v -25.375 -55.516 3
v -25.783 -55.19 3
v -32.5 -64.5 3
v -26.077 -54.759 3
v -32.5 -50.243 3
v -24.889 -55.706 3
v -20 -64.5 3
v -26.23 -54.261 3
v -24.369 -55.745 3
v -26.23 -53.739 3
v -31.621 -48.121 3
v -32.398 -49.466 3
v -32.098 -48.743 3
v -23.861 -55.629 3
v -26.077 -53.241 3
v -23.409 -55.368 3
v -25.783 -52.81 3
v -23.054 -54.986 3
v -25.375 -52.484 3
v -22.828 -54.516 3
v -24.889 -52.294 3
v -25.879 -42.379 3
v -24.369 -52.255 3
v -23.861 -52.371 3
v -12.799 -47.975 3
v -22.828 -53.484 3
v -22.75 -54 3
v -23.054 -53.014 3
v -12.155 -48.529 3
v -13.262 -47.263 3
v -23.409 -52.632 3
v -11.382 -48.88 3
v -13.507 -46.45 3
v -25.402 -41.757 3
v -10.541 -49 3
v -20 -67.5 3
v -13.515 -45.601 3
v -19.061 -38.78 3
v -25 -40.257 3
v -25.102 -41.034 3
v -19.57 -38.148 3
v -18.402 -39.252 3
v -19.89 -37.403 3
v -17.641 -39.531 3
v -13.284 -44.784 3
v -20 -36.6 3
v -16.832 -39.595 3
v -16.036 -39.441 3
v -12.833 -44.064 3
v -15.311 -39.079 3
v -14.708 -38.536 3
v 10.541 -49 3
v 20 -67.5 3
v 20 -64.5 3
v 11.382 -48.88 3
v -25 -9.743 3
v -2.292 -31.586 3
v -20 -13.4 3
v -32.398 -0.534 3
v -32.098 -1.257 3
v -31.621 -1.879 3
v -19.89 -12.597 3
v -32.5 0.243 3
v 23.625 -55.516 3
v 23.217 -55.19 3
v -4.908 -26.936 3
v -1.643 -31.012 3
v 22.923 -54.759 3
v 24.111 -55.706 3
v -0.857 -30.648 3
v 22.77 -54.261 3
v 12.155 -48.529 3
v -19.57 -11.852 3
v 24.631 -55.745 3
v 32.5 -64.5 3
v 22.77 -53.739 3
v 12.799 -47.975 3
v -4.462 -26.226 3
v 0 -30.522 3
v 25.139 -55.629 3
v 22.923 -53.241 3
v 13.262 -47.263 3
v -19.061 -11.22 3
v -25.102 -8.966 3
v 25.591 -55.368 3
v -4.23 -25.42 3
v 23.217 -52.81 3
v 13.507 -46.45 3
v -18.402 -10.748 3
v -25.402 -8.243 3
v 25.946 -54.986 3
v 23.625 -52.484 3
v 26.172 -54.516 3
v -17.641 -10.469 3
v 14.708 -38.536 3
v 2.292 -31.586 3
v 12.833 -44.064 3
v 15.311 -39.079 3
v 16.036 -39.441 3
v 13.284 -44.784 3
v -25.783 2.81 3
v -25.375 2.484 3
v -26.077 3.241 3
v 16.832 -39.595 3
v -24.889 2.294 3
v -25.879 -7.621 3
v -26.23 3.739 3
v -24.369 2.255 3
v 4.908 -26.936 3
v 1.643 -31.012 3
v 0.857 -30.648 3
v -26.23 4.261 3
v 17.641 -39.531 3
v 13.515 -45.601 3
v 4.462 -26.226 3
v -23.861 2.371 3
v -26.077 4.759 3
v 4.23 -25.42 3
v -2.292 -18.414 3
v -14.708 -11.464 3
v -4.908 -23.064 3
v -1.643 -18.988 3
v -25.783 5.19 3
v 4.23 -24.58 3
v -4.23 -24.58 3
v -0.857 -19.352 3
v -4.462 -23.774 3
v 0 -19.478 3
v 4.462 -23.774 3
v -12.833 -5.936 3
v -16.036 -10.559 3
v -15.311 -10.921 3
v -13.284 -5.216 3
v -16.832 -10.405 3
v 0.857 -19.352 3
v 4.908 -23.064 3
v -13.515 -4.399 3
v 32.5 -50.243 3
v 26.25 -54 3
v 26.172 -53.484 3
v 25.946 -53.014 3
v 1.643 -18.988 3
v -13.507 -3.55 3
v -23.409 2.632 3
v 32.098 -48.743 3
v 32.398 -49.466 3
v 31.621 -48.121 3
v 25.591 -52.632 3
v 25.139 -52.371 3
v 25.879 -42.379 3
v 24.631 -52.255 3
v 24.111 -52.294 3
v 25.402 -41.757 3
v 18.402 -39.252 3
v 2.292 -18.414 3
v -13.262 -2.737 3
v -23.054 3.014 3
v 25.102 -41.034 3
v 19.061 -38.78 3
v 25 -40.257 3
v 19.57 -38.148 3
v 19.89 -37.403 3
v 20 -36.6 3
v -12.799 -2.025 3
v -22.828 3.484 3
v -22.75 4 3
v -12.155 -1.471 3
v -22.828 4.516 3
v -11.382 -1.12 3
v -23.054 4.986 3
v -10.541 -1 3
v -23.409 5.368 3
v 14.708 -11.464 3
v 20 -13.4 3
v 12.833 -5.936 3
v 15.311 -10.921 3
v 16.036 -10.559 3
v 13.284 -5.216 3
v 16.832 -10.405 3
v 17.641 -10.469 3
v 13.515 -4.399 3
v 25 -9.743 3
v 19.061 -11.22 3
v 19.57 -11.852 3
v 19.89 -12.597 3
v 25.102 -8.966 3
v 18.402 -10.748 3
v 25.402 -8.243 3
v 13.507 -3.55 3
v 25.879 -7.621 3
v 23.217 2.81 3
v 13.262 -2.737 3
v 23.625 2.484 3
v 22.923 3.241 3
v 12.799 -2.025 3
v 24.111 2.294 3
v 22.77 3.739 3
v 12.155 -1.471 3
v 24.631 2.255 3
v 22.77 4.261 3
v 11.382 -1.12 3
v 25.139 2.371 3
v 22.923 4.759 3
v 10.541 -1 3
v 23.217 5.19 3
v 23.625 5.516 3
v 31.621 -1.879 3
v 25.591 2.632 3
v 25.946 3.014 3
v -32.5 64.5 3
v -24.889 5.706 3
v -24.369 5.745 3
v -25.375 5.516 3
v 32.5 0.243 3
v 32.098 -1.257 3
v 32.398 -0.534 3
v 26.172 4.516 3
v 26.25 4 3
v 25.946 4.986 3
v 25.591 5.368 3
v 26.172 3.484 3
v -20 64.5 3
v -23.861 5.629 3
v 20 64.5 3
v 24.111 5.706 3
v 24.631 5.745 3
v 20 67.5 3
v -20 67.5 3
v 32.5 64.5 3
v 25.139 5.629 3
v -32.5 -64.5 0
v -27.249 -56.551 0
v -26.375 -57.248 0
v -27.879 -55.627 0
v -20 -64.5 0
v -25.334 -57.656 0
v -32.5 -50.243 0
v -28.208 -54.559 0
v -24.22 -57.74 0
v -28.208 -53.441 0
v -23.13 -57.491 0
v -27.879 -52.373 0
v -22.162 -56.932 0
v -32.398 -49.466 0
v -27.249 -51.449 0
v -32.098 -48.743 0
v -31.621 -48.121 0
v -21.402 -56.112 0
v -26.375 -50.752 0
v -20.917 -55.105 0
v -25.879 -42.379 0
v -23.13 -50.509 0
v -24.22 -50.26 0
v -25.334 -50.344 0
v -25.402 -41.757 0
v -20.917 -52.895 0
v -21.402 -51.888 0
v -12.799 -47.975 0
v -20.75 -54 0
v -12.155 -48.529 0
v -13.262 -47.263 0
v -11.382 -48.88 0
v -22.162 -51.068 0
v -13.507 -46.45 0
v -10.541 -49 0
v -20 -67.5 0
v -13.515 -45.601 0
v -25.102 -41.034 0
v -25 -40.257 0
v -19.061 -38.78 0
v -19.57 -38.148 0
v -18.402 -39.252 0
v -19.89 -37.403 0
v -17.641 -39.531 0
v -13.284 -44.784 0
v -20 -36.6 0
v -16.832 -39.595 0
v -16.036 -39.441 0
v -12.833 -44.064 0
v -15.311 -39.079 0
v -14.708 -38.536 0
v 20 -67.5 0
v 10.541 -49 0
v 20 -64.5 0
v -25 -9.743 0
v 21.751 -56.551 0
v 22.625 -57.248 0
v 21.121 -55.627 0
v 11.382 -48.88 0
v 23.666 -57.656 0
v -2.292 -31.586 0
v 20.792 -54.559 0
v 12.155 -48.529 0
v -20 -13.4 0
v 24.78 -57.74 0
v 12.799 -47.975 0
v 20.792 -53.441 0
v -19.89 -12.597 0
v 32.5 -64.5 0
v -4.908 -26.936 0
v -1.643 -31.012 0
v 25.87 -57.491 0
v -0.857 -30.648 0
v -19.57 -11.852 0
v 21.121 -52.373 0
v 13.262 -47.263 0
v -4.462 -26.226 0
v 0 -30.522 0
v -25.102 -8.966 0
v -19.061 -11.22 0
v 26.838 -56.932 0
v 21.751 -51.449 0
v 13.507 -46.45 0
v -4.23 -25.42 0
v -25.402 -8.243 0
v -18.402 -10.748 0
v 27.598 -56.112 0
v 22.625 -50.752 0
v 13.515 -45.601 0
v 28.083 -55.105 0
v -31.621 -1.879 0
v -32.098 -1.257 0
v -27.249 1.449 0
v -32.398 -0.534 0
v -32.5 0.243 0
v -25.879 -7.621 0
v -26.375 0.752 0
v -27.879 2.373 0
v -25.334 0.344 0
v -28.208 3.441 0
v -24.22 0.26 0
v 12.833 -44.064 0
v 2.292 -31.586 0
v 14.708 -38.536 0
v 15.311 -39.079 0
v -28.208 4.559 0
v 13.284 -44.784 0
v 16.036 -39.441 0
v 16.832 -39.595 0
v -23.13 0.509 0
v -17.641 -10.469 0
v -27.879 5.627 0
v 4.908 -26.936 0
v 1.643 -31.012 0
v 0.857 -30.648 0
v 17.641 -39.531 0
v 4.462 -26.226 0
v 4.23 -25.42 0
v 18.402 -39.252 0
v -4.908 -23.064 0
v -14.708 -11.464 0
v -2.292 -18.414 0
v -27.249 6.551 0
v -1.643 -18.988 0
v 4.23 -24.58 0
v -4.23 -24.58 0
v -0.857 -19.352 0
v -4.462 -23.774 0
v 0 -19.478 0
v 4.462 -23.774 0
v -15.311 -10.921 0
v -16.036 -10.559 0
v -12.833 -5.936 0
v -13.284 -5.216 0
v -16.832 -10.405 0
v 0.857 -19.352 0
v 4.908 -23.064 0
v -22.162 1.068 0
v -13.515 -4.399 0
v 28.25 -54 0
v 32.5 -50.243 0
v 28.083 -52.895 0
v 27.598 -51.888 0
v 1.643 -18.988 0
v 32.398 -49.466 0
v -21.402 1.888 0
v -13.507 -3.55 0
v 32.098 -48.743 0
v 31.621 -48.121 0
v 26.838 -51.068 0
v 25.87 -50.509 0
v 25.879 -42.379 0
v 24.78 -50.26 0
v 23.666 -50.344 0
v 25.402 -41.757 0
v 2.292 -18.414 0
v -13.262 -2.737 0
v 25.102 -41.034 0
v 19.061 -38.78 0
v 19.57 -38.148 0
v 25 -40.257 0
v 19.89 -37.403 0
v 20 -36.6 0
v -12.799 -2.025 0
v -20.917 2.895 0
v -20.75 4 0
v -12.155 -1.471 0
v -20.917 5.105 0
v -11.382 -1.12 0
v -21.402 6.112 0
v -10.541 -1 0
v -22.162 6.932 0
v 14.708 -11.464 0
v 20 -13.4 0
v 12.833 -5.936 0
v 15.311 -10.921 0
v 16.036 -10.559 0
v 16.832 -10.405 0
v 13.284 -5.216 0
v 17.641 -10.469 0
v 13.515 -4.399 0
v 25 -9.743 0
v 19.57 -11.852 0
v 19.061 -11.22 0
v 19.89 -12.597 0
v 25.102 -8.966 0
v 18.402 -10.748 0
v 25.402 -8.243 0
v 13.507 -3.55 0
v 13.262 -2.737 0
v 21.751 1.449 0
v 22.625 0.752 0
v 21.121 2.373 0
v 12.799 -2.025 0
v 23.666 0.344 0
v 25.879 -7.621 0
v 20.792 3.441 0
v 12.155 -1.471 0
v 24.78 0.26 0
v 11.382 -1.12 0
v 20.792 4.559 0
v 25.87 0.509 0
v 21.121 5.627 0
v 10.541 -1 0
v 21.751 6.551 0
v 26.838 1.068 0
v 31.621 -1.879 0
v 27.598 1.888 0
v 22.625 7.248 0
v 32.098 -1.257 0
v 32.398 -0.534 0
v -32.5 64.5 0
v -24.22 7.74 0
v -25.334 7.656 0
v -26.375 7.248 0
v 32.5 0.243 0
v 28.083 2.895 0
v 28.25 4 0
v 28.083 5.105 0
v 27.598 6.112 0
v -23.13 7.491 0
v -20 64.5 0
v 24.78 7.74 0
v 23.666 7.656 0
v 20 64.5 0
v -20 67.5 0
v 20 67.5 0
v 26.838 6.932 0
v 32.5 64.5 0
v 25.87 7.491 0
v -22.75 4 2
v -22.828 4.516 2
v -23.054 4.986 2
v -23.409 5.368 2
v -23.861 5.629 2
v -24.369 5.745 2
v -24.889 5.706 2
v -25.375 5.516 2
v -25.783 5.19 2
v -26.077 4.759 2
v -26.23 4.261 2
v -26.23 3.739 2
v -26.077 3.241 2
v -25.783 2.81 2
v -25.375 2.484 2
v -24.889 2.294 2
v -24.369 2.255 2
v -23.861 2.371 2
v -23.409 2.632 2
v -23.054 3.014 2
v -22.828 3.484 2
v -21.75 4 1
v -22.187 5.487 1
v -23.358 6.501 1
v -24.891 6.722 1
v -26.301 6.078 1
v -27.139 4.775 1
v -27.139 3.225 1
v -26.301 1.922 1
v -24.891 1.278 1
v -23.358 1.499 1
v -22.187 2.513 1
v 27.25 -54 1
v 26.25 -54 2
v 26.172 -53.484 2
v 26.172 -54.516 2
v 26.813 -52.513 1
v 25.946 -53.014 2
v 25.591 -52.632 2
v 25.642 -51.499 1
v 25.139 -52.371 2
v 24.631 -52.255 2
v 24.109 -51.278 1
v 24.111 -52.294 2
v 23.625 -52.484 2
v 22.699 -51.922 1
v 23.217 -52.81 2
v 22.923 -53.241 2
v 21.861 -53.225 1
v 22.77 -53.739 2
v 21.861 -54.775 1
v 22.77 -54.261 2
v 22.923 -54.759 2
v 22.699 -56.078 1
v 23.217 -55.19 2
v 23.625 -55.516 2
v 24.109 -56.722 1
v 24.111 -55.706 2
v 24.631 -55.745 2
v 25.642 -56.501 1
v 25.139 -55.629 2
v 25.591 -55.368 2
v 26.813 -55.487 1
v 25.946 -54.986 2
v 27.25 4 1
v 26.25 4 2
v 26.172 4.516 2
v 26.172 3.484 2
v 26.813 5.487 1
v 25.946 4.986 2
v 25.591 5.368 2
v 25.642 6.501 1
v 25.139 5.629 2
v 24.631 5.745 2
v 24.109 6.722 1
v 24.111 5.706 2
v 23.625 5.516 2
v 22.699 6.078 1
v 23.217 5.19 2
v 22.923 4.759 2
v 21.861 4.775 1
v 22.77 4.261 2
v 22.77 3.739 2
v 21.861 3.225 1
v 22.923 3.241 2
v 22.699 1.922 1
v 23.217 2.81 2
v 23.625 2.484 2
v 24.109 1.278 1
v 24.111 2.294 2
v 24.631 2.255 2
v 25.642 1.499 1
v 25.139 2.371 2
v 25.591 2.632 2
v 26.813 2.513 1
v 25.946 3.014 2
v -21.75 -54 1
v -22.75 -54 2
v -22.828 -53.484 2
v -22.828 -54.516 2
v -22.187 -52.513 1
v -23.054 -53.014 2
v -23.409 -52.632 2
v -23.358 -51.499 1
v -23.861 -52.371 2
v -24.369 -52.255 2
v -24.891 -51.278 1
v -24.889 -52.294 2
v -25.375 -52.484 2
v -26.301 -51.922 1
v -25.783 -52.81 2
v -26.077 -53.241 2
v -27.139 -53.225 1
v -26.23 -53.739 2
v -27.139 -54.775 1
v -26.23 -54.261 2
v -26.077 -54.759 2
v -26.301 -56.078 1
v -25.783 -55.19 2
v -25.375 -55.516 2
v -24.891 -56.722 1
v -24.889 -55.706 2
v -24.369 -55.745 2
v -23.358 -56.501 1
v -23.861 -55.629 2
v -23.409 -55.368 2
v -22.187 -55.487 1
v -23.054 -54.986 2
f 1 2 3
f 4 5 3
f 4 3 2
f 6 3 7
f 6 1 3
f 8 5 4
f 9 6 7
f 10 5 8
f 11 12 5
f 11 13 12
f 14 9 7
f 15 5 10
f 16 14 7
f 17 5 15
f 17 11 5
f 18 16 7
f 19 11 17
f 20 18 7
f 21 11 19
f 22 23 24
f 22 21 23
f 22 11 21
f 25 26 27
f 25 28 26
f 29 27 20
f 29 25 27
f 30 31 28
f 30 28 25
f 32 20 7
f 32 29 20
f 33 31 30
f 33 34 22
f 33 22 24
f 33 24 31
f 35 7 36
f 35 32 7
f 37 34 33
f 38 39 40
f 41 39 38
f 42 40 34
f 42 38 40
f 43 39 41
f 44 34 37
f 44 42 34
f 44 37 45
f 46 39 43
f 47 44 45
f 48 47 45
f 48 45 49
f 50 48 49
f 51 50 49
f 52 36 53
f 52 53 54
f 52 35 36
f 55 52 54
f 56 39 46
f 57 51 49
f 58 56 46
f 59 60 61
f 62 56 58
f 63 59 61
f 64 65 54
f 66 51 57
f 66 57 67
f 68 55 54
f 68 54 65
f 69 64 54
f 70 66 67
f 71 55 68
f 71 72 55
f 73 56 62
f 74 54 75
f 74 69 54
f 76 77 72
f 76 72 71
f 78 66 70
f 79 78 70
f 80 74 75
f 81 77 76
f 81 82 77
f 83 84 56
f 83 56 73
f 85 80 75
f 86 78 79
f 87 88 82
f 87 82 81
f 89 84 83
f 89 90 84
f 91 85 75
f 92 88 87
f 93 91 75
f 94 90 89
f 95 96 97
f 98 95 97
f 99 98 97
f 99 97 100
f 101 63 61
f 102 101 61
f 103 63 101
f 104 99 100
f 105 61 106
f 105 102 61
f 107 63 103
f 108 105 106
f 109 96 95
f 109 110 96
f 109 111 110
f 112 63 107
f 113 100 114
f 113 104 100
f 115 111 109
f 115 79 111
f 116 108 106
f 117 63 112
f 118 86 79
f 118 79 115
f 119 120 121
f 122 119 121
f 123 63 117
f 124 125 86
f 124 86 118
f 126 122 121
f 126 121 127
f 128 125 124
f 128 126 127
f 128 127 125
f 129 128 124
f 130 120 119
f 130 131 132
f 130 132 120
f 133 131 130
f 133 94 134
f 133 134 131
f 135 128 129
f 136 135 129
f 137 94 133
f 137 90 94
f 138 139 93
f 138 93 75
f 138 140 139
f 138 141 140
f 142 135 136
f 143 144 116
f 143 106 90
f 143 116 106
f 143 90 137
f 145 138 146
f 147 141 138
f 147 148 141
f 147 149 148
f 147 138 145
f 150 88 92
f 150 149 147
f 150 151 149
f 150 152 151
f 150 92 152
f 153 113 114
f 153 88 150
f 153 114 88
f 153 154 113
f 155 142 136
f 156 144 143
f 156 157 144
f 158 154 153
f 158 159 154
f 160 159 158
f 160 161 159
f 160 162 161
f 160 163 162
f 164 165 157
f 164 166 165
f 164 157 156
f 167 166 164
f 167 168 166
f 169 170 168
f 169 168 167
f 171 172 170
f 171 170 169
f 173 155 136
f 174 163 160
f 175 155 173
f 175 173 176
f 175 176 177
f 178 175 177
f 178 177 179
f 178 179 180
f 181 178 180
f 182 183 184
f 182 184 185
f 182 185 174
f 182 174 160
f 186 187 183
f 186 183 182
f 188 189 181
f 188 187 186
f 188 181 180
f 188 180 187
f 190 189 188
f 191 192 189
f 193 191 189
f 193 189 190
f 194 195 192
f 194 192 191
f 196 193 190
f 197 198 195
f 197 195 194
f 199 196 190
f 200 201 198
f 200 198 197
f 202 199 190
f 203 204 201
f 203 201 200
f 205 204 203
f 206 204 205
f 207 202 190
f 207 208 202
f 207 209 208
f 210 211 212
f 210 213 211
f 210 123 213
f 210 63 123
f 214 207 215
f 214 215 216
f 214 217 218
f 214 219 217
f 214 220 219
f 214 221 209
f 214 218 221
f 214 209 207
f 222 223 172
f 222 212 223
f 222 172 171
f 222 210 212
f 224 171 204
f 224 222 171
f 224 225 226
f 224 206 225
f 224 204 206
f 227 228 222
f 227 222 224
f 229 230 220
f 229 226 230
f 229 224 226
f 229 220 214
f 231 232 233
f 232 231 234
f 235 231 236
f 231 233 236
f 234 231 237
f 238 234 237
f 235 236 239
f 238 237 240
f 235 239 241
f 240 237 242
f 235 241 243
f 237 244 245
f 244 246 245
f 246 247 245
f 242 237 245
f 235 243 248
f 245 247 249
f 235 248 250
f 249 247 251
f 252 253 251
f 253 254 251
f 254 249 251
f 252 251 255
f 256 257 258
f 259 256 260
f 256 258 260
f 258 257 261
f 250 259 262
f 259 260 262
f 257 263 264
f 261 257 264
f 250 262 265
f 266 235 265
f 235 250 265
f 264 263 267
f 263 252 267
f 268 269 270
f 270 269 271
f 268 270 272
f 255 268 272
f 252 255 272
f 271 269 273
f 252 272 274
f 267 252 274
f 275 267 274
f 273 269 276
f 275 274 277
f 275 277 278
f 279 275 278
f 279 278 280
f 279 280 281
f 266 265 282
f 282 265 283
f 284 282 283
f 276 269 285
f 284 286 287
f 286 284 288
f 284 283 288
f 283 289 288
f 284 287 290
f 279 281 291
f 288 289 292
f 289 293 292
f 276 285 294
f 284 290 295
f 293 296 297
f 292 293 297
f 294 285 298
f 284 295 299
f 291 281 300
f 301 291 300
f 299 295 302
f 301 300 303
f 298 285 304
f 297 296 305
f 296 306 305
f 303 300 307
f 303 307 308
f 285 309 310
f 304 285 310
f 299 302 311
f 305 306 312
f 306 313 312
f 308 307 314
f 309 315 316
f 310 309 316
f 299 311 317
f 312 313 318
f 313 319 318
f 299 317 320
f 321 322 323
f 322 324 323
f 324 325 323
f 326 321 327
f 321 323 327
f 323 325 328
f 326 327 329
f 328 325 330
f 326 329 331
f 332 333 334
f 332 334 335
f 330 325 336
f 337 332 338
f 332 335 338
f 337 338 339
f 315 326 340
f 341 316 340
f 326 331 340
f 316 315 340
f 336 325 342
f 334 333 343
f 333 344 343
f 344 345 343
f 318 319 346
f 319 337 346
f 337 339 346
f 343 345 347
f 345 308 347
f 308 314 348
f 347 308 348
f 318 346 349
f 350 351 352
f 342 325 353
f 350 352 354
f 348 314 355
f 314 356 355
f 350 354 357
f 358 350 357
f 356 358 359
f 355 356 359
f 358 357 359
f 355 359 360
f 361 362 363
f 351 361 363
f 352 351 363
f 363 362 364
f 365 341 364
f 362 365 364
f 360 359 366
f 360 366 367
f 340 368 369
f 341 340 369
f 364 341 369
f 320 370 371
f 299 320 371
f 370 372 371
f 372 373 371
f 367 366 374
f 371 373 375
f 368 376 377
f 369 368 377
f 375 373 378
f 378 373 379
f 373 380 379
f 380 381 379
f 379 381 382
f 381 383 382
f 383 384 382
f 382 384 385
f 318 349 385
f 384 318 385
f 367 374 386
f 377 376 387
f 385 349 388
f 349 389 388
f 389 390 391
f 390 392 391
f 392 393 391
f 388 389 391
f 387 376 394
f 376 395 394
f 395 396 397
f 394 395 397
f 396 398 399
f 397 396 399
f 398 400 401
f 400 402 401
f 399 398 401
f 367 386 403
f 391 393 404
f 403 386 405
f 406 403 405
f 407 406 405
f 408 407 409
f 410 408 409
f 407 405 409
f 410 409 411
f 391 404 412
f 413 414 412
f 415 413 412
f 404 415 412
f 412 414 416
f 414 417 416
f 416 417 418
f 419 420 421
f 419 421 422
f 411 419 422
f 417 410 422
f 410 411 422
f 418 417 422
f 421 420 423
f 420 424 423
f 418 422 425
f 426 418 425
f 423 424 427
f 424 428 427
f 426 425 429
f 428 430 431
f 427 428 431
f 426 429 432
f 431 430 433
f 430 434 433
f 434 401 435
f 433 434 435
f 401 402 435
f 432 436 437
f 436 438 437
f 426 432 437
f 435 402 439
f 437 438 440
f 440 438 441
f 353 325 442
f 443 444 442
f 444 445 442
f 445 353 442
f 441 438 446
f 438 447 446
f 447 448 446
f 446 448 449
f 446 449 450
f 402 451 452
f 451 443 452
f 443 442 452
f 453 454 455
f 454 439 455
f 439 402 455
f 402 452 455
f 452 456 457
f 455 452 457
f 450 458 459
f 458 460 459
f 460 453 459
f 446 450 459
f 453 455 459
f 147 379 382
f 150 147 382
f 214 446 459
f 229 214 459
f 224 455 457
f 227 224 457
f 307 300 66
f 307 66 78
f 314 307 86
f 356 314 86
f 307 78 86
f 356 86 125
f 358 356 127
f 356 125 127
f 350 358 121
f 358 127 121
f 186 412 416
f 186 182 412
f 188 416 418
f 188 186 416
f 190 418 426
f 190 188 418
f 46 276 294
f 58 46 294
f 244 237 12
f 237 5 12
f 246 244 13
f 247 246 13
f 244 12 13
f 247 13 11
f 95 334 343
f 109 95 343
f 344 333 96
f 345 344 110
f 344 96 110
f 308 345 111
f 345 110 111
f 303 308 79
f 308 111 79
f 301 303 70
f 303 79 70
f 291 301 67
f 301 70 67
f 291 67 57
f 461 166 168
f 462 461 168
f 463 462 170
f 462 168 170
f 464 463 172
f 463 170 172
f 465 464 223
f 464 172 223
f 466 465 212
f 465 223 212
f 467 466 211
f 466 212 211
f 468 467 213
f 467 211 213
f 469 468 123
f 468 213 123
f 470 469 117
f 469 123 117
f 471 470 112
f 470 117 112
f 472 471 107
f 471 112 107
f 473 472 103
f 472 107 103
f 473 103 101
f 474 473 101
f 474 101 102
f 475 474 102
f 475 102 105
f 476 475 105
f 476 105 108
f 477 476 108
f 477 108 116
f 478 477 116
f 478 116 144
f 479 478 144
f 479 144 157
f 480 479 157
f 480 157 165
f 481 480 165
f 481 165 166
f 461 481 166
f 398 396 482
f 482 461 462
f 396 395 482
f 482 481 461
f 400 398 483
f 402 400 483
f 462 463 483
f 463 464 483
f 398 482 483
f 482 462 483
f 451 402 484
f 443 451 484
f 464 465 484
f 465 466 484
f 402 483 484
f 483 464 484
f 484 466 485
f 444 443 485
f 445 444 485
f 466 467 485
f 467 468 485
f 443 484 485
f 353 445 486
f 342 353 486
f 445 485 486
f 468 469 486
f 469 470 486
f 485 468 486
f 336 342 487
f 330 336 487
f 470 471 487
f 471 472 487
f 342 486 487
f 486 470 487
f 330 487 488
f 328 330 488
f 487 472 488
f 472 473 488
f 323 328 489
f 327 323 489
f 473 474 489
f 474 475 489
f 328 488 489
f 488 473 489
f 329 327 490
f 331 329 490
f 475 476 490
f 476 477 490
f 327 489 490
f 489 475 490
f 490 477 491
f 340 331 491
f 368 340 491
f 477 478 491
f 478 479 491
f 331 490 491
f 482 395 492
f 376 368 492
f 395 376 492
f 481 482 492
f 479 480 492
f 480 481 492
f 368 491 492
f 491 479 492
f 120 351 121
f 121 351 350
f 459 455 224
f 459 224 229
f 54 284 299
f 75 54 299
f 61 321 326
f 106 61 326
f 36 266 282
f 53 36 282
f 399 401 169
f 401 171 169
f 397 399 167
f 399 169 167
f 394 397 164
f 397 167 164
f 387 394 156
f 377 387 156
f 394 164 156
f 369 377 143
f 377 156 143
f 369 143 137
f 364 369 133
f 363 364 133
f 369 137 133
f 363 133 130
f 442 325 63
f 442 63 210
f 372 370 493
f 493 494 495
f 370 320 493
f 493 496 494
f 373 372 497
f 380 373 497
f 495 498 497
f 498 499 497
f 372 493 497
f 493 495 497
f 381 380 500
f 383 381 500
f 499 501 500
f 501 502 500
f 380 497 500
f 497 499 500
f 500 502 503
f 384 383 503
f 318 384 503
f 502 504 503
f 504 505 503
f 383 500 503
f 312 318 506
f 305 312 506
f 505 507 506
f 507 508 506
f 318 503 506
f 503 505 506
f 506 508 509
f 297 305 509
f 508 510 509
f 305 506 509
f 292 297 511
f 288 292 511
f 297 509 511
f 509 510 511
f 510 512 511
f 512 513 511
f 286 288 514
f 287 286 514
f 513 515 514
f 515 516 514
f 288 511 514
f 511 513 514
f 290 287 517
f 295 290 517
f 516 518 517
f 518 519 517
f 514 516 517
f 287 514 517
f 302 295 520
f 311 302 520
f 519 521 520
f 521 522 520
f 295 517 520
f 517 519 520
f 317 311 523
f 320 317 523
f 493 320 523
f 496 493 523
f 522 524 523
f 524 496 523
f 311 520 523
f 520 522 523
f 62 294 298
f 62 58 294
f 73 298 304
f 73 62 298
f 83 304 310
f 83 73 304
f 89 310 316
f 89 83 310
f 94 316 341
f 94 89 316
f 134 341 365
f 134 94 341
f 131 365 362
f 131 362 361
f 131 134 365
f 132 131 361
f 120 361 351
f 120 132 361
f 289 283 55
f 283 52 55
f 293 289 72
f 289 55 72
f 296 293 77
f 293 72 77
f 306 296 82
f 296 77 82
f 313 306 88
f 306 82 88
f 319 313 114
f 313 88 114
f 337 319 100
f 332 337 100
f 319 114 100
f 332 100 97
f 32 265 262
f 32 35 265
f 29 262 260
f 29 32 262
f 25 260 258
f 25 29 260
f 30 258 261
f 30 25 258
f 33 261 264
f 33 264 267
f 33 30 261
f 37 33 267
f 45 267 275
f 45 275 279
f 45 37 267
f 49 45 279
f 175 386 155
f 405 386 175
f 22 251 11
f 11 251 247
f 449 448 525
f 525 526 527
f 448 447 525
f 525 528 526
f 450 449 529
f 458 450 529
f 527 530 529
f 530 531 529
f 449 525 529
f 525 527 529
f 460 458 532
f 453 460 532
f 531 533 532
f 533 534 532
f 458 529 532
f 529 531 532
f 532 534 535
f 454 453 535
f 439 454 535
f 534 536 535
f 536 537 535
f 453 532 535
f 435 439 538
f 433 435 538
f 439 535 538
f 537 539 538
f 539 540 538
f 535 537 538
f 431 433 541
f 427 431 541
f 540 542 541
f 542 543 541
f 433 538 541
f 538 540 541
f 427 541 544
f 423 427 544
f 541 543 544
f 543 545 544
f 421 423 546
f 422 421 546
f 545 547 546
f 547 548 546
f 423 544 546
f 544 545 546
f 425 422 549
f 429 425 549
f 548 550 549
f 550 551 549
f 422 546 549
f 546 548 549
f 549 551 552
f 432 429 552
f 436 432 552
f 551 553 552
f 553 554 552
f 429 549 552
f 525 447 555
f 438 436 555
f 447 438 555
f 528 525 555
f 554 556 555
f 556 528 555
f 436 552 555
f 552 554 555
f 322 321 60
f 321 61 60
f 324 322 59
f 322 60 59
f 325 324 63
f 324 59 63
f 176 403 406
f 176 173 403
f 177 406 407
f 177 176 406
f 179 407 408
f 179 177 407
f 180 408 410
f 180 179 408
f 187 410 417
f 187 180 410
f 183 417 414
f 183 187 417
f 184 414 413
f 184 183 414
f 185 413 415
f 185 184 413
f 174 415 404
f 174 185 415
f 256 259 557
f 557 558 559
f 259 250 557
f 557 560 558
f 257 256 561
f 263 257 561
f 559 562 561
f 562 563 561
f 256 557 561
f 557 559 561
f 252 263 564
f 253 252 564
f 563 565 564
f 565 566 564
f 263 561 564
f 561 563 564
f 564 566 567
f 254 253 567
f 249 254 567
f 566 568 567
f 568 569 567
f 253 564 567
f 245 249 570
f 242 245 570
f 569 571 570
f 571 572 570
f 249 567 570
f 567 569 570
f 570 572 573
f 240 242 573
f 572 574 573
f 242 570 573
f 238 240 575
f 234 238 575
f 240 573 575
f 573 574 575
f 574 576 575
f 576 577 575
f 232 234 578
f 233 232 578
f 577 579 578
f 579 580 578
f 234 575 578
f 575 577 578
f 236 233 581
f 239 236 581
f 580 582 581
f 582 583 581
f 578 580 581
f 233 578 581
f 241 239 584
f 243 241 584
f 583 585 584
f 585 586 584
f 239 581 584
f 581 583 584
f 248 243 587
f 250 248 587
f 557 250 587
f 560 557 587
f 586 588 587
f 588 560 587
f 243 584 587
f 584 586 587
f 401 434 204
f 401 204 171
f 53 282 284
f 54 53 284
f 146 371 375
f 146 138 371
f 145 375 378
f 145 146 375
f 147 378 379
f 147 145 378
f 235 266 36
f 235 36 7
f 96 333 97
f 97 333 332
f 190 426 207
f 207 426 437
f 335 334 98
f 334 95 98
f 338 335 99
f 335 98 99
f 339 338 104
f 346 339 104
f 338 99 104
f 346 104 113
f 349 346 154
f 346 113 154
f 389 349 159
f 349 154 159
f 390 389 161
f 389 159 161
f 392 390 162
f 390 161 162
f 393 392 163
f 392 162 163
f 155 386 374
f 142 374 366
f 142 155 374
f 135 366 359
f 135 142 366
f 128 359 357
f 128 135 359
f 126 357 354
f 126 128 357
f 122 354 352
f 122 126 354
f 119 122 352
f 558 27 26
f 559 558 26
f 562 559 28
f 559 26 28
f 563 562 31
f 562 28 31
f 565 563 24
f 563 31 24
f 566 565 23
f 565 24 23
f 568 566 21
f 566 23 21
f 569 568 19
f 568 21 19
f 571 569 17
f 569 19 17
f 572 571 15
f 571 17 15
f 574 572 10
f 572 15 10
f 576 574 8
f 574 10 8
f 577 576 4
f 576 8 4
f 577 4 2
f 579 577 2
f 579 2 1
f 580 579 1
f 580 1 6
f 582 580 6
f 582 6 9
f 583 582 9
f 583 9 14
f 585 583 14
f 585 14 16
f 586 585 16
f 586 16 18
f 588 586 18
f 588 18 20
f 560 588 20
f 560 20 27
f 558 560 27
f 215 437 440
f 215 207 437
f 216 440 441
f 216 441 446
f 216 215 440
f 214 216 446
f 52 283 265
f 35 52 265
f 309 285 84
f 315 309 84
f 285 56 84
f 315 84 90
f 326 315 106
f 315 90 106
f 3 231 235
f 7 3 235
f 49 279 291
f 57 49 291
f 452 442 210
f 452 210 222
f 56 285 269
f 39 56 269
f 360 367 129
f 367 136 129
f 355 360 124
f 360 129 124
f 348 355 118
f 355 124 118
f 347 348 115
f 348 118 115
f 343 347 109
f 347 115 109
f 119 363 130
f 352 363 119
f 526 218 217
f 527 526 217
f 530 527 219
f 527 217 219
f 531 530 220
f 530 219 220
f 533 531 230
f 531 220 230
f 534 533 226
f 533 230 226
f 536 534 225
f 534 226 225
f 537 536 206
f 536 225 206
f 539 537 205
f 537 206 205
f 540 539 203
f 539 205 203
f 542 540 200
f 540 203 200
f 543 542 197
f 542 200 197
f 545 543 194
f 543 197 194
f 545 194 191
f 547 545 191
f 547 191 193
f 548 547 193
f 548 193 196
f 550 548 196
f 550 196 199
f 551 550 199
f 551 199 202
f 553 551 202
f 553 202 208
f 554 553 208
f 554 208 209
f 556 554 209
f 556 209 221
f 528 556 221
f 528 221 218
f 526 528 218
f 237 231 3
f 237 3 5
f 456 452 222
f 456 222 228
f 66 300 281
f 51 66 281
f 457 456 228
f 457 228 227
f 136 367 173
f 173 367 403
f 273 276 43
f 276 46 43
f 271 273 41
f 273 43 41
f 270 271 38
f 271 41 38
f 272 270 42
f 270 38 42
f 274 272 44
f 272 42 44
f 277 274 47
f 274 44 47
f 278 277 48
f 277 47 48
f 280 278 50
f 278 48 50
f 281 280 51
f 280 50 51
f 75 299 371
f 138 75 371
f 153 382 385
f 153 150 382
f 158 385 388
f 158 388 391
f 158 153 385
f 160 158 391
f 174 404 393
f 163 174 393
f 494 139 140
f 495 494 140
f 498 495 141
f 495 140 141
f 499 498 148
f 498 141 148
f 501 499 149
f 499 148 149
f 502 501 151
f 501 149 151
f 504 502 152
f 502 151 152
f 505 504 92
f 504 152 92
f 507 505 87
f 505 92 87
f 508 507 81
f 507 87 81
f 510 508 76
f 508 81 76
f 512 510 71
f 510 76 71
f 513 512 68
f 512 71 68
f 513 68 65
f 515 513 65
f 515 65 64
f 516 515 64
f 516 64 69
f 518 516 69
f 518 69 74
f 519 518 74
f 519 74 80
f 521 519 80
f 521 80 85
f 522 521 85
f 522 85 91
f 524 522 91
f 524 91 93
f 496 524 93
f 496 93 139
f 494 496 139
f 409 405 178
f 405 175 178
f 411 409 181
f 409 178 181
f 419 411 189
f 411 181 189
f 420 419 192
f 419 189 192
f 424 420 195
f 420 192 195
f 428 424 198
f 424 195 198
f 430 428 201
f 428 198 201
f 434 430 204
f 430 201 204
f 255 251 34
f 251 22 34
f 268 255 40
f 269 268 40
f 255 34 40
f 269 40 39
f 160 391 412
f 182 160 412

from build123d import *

# Parameters (mm, degrees)
SKETCH_1_W          = 65
SKETCH_1_H          = 129
SKETCH_1_W_2        = 40
SKETCH_1_H_2        = 6
EXTRUDE_1_DEPTH     = 3
SKETCH_2_R          = 1.75
CUT_EXTRUDE_1_DEPTH = 10
CHAMFER_1_SIZE      = 2
CUT_EXTRUDE_2_DEPTH = 10
FILLET_1_R          = 3
FILLET_2_R          = 3
FILLET_3_R          = 3


with BuildPart() as part:
    # Эскиз1 → Бобышка-Вытянуть1 (new body)
    with BuildSketch(Plane.XY):
        Rectangle(SKETCH_1_W, SKETCH_1_H)
        with Locations((0, 64.5)):
            Rectangle(SKETCH_1_W_2, SKETCH_1_H_2)
        with Locations((0, -64.5)):
            Rectangle(SKETCH_1_W_2, SKETCH_1_H_2)
    extrude(amount=EXTRUDE_1_DEPTH)

    # Эскиз2 → Вырез-Вытянуть1 (cut)
    with BuildSketch(Plane.XY.offset(3)):
        with Locations((-24.5, 4)):
            Circle(SKETCH_2_R)
        with Locations((24.5, 4)):
            Circle(SKETCH_2_R)
        with Locations((24.5, -54)):
            Circle(SKETCH_2_R)
        with Locations((-24.5, -54)):
            Circle(SKETCH_2_R)
    extrude(amount=-CUT_EXTRUDE_1_DEPTH, mode=Mode.SUBTRACT)

    # Фаска1
    chamfer_1_edges = [part.edges().sort_by_distance(p)[0] for p in [
        (-26.25, -54, 0),
        (22.75, -54, 0),
        (22.75, 4, 0),
        (-26.25, 4, 0),
    ]]
    chamfer(chamfer_1_edges, length=CHAMFER_1_SIZE)

    # Эскиз3 → Вырез-Вытянуть2 (cut)
    with BuildSketch(Plane(origin=(0, 0, 0), x_dir=(-1, 0, 0), z_dir=(0, 0, -1))):
        Polygon((32.5, -1), (25, -8.5), (25, -41.5), (32.5, -49), (35.92761887, -49), (35.92761887, -1), align=None)
        Polygon((-35.92761887, -49), (-32.5, -49), (-25, -41.5), (-25, -8.5), (-32.5, -1), (-35.92761887, -1), align=None)
        Polygon((0, -21.126143006), (-17.003120815, -1), (17.003120815, -1), align=None)
        Polygon((20, -5.200387607), (3.272741254, -25), (20, -44.799612393), align=None)
        Polygon((17.003120815, -49), (0, -28.873856994), (-17.003120815, -49), align=None)
        Polygon((-20, -5.200387607), (-20, -44.799612393), (-3.272741254, -25), align=None)
    extrude(amount=-CUT_EXTRUDE_2_DEPTH, mode=Mode.SUBTRACT)

    # Скругление1
    fillet_1_edges = [part.edges().sort_by_distance(p)[0] for p in [
        (-32.5, -1, 1.5),
        (-32.5, -49, 1.5),
        (-25, -41.5, 1.5),
        (-25, -8.5, 1.5),
    ]]
    fillet(fillet_1_edges, radius=FILLET_1_R)

    # Скругление2
    fillet_2_edges = [part.edges().sort_by_distance(p)[0] for p in [
        (32.5, -1, 1.5),
        (25, -8.5, 1.5),
        (25, -41.5, 1.5),
        (32.5, -49, 1.5),
    ]]
    fillet(fillet_2_edges, radius=FILLET_2_R)

    # Скругление3
    fillet_3_edges = [part.edges().sort_by_distance(p)[0] for p in [
        (17.003120815, -49, 1.5),
        (0, -28.873856994, 1.5),
        (-17.003120815, -49, 1.5),
        (-20, -44.799612393, 1.5),
        (-3.272741254, -25, 1.5),
        (-20, -5.200387607, 1.5),
        (3.272741254, -25, 1.5),
        (20, -44.799612393, 1.5),
        (20, -5.200387607, 1.5),
        (-17.003120815, -1, 1.5),
        (0, -21.126143006, 1.5),
        (17.003120815, -1, 1.5),
    ]]
    fillet(fillet_3_edges, radius=FILLET_3_R)


solid = part.part
